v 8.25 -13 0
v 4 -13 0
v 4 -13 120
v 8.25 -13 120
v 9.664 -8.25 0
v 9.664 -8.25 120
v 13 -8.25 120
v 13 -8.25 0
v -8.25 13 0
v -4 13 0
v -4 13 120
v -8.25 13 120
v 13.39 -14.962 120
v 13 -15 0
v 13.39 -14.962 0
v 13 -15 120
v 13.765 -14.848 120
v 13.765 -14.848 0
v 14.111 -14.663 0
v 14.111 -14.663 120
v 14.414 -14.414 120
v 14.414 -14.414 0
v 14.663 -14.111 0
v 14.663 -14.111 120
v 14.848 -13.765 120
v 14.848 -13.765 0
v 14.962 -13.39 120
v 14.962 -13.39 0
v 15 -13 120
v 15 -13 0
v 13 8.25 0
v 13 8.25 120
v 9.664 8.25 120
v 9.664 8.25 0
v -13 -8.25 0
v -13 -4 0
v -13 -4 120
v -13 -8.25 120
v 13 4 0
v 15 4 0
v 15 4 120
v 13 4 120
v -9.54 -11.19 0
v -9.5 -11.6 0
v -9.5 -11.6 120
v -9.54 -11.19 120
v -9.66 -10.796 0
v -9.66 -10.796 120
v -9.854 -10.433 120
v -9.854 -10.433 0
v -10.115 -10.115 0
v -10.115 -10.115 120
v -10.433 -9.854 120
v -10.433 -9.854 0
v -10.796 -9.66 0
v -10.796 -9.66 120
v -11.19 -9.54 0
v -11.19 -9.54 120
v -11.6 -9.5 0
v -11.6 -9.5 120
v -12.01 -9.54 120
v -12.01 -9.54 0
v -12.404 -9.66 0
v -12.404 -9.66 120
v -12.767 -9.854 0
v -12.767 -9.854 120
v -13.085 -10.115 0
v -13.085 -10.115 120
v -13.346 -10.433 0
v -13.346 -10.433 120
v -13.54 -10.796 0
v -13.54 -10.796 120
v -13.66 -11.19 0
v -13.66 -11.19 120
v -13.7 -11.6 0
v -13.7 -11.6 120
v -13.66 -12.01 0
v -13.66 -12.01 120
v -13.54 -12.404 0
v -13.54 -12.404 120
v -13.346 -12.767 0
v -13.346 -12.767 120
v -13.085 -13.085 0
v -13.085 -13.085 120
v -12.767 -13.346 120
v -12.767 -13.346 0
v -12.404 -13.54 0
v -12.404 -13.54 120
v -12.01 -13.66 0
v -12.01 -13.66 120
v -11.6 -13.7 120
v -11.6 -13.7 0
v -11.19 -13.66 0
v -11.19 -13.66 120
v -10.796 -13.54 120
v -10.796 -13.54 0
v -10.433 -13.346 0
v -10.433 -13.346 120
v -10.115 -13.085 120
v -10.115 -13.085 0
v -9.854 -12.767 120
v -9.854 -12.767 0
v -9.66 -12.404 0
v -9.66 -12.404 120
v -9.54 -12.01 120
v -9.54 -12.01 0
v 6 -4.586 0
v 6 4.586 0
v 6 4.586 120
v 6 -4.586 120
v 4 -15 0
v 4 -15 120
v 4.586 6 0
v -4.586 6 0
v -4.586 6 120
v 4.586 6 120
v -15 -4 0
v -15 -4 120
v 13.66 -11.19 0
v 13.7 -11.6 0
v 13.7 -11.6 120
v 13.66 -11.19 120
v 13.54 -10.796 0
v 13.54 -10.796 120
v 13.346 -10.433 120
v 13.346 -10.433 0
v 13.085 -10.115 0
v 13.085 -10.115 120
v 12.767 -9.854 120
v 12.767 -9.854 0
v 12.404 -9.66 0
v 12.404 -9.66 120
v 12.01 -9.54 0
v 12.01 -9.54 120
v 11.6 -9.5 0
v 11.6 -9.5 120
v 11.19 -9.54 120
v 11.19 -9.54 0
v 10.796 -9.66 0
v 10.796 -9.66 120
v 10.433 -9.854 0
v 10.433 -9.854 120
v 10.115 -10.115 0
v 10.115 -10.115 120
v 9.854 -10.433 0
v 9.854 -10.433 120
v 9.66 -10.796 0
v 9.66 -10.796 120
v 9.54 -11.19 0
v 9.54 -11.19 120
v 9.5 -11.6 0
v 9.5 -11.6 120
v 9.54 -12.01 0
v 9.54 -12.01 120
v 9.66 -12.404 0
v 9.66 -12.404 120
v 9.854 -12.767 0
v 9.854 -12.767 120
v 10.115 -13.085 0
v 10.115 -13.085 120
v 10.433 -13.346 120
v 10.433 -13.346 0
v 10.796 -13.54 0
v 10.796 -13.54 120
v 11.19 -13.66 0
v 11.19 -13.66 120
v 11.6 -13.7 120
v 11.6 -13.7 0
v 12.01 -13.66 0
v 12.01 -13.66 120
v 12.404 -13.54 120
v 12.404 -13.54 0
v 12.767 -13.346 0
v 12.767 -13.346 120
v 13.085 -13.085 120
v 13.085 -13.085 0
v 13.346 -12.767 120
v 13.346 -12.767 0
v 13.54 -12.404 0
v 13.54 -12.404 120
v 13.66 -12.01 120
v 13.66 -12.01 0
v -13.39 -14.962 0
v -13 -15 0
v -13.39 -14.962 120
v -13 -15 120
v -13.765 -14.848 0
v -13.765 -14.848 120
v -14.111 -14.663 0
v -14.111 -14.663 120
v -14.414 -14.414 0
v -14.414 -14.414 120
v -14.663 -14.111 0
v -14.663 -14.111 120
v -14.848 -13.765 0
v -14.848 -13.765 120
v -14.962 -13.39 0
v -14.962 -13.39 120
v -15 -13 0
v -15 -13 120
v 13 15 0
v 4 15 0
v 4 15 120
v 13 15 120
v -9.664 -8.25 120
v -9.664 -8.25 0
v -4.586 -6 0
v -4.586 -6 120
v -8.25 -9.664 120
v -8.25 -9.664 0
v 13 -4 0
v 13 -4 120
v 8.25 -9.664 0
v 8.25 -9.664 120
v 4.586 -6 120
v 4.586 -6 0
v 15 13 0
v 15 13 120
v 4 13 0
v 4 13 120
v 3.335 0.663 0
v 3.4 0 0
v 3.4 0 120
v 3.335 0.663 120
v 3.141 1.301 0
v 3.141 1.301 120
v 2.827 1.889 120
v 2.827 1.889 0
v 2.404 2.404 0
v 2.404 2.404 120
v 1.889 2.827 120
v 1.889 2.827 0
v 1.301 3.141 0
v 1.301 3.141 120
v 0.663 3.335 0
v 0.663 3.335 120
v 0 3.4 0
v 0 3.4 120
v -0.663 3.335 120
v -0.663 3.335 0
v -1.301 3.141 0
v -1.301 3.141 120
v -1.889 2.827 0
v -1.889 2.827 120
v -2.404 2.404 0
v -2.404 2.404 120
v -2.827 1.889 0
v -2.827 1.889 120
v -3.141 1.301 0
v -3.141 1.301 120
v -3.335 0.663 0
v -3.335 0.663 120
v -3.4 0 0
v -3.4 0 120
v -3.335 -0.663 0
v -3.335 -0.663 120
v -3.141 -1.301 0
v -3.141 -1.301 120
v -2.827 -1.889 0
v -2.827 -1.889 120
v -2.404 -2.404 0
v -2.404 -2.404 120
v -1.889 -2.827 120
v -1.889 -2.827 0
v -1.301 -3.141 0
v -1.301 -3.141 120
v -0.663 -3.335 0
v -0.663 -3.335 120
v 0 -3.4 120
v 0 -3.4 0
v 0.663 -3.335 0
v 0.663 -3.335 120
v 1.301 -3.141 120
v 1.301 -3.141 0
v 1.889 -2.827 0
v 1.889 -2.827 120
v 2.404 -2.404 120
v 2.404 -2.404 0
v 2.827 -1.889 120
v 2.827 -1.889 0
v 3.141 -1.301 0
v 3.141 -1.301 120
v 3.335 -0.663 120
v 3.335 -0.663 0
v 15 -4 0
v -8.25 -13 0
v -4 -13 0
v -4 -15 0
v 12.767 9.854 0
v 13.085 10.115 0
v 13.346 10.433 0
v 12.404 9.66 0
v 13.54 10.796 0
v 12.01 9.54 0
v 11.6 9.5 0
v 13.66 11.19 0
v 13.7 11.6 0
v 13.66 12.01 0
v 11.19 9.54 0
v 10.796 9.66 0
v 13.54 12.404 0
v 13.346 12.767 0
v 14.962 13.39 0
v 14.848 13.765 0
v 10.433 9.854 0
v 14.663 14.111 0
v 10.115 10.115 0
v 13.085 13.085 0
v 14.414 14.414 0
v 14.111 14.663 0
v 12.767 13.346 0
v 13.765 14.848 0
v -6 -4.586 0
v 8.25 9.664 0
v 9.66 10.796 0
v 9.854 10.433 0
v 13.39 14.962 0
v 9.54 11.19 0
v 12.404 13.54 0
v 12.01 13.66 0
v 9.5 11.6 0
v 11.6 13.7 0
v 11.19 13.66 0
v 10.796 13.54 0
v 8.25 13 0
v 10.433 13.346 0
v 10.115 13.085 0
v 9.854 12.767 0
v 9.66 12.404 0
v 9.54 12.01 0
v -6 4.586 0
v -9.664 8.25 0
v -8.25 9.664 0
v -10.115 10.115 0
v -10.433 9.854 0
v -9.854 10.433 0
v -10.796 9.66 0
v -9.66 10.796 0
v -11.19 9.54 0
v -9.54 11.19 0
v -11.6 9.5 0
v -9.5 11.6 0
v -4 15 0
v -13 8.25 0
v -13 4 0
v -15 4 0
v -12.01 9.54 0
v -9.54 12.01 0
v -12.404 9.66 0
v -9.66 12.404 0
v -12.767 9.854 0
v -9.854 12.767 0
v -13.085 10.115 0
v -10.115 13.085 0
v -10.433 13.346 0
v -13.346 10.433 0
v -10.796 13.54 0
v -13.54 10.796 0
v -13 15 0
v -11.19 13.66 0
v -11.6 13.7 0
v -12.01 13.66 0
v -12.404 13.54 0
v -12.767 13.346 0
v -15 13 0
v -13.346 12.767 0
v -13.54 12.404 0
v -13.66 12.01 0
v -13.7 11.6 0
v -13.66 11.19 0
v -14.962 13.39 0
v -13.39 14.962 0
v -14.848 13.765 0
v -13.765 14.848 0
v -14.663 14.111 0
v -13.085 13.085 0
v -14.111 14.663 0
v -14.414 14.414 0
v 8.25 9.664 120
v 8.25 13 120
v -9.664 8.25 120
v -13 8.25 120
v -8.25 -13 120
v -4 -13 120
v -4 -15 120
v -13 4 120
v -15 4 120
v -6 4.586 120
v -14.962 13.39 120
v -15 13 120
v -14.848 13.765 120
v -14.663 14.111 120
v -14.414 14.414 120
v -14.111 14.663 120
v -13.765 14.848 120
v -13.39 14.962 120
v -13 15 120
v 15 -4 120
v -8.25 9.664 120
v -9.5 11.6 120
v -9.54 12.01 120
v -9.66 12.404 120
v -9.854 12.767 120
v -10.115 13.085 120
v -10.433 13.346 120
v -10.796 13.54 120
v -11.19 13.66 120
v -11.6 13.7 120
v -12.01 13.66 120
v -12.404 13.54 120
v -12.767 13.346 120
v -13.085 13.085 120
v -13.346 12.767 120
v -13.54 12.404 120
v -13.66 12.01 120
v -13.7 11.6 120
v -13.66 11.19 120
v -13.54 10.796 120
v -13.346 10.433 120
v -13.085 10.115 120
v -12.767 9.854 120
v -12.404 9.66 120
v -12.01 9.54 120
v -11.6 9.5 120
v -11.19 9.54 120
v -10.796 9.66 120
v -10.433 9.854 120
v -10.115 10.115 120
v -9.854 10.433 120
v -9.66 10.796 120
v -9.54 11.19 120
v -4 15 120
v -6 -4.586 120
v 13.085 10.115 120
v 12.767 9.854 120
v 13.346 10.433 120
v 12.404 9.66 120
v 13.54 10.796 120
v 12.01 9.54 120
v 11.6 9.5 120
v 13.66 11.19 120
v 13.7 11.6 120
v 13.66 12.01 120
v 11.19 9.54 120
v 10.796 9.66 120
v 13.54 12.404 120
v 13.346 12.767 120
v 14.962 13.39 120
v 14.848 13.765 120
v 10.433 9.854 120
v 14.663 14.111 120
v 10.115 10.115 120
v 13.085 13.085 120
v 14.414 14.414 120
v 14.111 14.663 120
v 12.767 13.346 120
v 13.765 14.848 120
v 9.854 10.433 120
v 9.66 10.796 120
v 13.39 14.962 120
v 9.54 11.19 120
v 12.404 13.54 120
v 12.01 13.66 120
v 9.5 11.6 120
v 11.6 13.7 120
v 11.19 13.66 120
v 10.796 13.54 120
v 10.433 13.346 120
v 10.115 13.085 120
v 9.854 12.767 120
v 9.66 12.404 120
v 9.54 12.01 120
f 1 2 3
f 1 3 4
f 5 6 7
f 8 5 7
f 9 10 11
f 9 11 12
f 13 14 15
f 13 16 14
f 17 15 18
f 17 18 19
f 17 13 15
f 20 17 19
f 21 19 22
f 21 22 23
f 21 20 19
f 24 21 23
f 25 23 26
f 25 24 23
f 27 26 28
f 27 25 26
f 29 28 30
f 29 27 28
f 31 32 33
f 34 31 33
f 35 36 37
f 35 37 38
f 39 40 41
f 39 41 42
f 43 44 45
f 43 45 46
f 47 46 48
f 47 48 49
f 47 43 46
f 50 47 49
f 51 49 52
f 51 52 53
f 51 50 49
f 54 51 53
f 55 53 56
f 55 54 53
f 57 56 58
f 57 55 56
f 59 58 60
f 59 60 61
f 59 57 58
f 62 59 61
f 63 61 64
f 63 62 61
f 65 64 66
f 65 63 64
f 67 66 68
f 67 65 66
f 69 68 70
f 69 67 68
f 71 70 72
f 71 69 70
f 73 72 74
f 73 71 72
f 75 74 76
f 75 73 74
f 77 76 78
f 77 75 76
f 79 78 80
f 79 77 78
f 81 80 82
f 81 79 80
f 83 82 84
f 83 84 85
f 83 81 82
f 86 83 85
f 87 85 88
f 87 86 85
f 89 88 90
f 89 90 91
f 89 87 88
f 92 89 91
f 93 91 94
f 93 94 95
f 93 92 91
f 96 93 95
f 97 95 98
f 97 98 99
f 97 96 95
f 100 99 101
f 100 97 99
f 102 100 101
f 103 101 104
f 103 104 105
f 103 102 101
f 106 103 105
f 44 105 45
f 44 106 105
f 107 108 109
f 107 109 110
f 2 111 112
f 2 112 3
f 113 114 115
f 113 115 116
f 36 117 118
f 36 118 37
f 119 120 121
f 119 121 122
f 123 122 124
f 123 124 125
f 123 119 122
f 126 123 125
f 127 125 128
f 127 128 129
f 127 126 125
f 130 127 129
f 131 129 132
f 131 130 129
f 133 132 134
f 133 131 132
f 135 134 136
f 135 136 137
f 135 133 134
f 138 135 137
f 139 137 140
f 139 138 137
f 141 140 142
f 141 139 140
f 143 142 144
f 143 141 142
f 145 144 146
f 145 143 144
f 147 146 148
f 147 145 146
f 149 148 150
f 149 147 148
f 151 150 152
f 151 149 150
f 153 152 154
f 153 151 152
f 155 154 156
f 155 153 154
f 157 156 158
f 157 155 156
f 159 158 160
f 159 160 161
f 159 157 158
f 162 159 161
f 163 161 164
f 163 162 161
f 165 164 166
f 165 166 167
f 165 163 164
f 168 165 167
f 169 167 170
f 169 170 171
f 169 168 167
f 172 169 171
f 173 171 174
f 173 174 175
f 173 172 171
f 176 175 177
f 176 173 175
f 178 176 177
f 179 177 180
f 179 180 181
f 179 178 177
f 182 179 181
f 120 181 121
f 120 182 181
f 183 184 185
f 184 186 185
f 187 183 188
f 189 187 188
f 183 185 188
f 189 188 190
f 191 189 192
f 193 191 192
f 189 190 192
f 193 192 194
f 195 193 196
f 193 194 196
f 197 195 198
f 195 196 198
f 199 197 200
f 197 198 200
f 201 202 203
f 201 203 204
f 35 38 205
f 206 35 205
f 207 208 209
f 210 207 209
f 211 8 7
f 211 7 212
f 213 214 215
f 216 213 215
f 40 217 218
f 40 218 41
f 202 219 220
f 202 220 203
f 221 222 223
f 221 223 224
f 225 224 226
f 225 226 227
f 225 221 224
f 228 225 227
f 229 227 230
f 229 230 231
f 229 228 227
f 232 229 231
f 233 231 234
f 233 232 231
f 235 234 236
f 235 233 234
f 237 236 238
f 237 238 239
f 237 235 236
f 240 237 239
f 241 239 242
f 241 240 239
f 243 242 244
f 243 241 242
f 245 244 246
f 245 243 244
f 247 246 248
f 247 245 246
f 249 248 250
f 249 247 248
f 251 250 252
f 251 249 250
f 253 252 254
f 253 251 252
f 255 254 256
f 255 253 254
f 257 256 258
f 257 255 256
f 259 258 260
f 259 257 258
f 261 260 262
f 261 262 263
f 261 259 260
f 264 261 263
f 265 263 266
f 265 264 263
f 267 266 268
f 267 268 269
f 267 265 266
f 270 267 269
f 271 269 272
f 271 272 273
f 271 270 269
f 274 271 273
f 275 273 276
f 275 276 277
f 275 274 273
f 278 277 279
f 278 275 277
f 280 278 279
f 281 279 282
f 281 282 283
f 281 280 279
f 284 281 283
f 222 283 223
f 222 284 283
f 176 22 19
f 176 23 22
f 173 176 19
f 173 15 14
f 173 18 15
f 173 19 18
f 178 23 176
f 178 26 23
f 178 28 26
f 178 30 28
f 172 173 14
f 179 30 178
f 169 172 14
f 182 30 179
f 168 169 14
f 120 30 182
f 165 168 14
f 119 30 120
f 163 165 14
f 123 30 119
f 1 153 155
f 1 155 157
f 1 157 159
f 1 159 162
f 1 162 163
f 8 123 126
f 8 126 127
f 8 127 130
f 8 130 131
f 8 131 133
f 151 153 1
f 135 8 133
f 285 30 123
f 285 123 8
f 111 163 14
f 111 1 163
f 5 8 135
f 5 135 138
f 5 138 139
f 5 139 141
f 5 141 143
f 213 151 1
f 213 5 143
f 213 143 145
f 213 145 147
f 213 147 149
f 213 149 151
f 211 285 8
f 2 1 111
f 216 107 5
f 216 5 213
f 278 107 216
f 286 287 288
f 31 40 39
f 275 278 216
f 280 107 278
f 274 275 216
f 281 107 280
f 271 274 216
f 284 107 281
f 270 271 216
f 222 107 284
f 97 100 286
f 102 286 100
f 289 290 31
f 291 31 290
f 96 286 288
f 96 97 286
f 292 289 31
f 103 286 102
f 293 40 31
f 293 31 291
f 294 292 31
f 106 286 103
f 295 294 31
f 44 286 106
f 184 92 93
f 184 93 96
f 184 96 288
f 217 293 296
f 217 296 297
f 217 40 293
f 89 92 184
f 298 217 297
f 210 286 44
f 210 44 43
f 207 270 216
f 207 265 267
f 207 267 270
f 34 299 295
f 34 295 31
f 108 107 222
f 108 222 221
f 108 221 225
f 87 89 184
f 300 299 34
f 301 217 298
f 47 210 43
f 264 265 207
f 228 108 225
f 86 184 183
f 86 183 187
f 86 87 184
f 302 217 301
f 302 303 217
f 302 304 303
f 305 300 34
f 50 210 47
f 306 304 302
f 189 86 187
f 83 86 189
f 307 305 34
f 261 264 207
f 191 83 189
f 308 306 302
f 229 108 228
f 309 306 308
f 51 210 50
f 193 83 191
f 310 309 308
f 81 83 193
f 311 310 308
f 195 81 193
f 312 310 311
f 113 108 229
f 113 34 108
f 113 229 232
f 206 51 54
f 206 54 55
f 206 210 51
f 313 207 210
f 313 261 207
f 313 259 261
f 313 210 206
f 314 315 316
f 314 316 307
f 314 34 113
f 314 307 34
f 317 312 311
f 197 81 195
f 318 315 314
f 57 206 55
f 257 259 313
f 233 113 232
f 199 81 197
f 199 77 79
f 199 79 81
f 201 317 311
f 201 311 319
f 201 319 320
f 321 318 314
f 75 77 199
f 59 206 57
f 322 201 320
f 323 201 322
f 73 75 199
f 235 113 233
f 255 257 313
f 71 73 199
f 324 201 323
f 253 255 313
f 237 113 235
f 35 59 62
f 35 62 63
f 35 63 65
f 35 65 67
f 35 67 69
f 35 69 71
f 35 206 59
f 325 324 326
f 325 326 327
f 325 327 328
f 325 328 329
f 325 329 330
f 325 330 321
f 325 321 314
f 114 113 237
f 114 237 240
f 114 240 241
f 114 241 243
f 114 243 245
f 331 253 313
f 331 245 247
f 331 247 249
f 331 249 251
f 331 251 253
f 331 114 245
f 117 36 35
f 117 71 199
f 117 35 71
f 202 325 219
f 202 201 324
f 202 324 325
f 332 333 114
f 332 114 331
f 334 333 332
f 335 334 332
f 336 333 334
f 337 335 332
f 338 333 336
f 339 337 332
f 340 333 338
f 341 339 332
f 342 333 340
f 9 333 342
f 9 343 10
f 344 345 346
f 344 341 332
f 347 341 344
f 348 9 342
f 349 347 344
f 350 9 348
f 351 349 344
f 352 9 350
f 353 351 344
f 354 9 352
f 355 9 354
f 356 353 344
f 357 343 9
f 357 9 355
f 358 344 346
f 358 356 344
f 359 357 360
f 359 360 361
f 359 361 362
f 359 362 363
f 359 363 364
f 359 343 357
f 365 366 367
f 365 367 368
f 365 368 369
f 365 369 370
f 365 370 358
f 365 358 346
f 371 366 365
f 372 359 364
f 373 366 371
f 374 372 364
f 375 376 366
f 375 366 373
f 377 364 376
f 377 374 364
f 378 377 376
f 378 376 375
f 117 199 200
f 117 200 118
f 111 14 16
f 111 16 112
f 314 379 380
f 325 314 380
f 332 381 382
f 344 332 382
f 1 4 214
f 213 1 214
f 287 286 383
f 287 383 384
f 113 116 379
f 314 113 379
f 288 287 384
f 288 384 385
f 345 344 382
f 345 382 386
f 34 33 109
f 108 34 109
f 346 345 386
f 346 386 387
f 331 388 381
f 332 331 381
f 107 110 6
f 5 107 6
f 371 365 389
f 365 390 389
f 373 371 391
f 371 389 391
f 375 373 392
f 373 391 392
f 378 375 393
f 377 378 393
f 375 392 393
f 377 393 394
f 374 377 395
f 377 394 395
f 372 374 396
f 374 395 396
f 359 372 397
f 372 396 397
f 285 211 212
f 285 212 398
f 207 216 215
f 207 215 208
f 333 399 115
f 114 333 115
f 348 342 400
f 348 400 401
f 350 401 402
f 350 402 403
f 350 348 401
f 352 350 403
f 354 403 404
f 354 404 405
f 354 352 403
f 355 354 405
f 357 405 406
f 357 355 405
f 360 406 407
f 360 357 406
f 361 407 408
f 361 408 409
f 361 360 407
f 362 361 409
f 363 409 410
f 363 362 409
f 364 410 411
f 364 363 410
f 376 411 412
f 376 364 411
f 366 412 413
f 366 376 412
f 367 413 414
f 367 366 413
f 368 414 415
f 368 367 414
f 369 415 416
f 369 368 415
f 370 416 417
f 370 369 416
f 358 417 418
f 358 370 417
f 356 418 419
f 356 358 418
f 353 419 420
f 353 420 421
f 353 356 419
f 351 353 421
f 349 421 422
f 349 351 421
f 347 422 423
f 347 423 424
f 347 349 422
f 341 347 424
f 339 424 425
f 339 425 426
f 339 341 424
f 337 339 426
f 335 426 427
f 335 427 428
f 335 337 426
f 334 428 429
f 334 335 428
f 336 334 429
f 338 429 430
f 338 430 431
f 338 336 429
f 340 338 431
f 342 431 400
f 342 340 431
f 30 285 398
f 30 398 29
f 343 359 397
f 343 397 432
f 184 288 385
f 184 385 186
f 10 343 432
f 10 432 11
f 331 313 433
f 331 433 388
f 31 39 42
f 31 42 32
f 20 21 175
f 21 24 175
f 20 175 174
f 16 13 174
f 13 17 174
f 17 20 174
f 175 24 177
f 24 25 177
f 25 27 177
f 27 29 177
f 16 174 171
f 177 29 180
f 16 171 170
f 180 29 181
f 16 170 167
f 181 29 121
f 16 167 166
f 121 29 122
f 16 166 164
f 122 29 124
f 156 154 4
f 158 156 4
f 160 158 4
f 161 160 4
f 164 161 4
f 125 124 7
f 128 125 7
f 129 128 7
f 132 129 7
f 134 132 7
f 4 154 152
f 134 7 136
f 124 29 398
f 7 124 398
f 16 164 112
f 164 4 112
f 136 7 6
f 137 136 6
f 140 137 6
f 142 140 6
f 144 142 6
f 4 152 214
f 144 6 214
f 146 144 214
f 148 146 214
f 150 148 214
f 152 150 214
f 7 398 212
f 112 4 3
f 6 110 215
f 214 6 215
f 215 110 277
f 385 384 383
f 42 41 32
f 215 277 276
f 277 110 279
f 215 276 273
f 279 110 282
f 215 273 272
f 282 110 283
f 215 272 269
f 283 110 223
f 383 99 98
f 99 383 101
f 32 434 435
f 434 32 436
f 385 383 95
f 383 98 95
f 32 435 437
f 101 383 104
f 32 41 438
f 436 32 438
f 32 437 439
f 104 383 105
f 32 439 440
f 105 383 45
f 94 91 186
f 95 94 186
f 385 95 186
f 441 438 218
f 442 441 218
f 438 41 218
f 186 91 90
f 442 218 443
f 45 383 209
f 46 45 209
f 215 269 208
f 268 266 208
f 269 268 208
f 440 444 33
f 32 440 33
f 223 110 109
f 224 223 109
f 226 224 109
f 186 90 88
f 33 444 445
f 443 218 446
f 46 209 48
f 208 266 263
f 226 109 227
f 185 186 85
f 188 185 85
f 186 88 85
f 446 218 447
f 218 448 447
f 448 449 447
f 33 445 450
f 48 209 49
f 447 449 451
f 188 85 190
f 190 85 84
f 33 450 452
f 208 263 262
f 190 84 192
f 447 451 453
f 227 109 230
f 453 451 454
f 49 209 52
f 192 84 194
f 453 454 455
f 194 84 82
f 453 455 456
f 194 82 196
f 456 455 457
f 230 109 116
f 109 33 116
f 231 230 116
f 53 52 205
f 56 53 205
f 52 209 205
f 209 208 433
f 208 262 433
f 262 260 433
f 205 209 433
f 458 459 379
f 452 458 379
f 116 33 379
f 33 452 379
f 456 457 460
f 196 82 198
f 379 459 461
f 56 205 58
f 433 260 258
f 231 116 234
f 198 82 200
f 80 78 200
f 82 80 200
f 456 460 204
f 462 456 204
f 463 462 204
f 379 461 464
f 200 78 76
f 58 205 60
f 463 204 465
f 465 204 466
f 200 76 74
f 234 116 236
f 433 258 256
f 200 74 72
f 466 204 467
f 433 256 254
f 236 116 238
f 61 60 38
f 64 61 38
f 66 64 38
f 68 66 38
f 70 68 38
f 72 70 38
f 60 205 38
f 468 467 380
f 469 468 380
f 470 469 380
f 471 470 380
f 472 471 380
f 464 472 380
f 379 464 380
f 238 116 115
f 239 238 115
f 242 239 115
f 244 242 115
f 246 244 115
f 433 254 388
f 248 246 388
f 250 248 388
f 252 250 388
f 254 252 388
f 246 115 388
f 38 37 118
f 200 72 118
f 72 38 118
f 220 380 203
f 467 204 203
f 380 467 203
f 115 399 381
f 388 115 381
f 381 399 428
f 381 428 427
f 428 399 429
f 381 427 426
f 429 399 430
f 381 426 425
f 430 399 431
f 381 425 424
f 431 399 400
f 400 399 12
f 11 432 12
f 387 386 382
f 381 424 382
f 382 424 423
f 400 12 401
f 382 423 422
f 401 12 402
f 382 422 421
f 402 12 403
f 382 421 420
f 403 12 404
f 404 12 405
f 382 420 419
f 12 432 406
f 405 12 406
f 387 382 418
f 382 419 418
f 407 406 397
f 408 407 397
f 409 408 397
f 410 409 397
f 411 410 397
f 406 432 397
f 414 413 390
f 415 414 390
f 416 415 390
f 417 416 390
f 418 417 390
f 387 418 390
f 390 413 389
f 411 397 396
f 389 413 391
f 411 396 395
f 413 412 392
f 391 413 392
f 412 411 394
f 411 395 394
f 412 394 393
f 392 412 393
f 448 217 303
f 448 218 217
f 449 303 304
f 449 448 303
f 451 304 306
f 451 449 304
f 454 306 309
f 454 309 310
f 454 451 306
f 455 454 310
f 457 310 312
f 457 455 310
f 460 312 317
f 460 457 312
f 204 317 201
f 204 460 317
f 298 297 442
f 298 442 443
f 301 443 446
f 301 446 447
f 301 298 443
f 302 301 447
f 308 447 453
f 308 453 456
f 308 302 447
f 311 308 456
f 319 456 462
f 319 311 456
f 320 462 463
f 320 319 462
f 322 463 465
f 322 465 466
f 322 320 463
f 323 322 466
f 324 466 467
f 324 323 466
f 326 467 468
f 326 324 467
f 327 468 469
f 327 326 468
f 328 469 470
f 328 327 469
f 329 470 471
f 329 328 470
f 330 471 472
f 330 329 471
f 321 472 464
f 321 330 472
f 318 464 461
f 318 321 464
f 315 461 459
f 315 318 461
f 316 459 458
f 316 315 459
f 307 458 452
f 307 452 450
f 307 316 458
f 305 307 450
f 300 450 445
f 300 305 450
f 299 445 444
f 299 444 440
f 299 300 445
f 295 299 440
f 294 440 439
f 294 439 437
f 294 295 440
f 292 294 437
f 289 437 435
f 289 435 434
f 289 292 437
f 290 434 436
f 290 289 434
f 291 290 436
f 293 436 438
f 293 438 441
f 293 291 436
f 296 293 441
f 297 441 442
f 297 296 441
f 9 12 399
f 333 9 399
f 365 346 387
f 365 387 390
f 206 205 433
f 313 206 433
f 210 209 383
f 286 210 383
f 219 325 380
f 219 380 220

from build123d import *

# Parameters (mm, degrees)
SKETCH1_R           = 3.4
SKETCH1_R_2         = 2.1
BOSS_EXTRUDE1_DEPTH = 120
FILLET1_R           = 2


with BuildPart() as part:
    # Sketch1 → Boss-Extrude1 (new body)
    with BuildSketch(Plane.XY):
        Polygon((15, -15), (4, -15), (4, -13), (8.25, -13), (8.25, -9.664213562), (4.585786438, -6), (-4.585786438, -6), (-8.25, -9.664213562), (-8.25, -13), (-4, -13), (-4, -15), (-15, -15), (-15, -4), (-13, -4), (-13, -8.25), (-9.664213562, -8.25), (-6, -4.585786438), (-6, 4.585786438), (-9.664213562, 8.25), (-13, 8.25), (-13, 4), (-15, 4), (-15, 15), (-4, 15), (-4, 13), (-8.25, 13), (-8.25, 9.664213562), (-4.585786438, 6), (4.585786438, 6), (8.25, 9.664213562), (8.25, 13), (4, 13), (4, 15), (15, 15), (15, 4), (13, 4), (13, 8.25), (9.664213562, 8.25), (6, 4.585786438), (6, -4.585786438), (9.664213562, -8.25), (13, -8.25), (13, -4), (15, -4), align=None)
        Circle(SKETCH1_R, mode=Mode.SUBTRACT)
        with Locations((-11.6, 11.6)):
            Circle(SKETCH1_R_2, mode=Mode.SUBTRACT)
        with Locations((11.6, 11.6)):
            Circle(SKETCH1_R_2, mode=Mode.SUBTRACT)
        with Locations((11.6, -11.6)):
            Circle(SKETCH1_R_2, mode=Mode.SUBTRACT)
        with Locations((-11.6, -11.6)):
            Circle(SKETCH1_R_2, mode=Mode.SUBTRACT)
    extrude(amount=BOSS_EXTRUDE1_DEPTH)

    # Fillet1
    fillet1_edges = [part.edges().sort_by_distance(p)[0] for p in [
        (-15, -15, 60),
        (-15, 15, 60),
        (15, 15, 60),
        (15, -15, 60),
    ]]
    fillet(fillet1_edges, radius=FILLET1_R)


solid = part.part
